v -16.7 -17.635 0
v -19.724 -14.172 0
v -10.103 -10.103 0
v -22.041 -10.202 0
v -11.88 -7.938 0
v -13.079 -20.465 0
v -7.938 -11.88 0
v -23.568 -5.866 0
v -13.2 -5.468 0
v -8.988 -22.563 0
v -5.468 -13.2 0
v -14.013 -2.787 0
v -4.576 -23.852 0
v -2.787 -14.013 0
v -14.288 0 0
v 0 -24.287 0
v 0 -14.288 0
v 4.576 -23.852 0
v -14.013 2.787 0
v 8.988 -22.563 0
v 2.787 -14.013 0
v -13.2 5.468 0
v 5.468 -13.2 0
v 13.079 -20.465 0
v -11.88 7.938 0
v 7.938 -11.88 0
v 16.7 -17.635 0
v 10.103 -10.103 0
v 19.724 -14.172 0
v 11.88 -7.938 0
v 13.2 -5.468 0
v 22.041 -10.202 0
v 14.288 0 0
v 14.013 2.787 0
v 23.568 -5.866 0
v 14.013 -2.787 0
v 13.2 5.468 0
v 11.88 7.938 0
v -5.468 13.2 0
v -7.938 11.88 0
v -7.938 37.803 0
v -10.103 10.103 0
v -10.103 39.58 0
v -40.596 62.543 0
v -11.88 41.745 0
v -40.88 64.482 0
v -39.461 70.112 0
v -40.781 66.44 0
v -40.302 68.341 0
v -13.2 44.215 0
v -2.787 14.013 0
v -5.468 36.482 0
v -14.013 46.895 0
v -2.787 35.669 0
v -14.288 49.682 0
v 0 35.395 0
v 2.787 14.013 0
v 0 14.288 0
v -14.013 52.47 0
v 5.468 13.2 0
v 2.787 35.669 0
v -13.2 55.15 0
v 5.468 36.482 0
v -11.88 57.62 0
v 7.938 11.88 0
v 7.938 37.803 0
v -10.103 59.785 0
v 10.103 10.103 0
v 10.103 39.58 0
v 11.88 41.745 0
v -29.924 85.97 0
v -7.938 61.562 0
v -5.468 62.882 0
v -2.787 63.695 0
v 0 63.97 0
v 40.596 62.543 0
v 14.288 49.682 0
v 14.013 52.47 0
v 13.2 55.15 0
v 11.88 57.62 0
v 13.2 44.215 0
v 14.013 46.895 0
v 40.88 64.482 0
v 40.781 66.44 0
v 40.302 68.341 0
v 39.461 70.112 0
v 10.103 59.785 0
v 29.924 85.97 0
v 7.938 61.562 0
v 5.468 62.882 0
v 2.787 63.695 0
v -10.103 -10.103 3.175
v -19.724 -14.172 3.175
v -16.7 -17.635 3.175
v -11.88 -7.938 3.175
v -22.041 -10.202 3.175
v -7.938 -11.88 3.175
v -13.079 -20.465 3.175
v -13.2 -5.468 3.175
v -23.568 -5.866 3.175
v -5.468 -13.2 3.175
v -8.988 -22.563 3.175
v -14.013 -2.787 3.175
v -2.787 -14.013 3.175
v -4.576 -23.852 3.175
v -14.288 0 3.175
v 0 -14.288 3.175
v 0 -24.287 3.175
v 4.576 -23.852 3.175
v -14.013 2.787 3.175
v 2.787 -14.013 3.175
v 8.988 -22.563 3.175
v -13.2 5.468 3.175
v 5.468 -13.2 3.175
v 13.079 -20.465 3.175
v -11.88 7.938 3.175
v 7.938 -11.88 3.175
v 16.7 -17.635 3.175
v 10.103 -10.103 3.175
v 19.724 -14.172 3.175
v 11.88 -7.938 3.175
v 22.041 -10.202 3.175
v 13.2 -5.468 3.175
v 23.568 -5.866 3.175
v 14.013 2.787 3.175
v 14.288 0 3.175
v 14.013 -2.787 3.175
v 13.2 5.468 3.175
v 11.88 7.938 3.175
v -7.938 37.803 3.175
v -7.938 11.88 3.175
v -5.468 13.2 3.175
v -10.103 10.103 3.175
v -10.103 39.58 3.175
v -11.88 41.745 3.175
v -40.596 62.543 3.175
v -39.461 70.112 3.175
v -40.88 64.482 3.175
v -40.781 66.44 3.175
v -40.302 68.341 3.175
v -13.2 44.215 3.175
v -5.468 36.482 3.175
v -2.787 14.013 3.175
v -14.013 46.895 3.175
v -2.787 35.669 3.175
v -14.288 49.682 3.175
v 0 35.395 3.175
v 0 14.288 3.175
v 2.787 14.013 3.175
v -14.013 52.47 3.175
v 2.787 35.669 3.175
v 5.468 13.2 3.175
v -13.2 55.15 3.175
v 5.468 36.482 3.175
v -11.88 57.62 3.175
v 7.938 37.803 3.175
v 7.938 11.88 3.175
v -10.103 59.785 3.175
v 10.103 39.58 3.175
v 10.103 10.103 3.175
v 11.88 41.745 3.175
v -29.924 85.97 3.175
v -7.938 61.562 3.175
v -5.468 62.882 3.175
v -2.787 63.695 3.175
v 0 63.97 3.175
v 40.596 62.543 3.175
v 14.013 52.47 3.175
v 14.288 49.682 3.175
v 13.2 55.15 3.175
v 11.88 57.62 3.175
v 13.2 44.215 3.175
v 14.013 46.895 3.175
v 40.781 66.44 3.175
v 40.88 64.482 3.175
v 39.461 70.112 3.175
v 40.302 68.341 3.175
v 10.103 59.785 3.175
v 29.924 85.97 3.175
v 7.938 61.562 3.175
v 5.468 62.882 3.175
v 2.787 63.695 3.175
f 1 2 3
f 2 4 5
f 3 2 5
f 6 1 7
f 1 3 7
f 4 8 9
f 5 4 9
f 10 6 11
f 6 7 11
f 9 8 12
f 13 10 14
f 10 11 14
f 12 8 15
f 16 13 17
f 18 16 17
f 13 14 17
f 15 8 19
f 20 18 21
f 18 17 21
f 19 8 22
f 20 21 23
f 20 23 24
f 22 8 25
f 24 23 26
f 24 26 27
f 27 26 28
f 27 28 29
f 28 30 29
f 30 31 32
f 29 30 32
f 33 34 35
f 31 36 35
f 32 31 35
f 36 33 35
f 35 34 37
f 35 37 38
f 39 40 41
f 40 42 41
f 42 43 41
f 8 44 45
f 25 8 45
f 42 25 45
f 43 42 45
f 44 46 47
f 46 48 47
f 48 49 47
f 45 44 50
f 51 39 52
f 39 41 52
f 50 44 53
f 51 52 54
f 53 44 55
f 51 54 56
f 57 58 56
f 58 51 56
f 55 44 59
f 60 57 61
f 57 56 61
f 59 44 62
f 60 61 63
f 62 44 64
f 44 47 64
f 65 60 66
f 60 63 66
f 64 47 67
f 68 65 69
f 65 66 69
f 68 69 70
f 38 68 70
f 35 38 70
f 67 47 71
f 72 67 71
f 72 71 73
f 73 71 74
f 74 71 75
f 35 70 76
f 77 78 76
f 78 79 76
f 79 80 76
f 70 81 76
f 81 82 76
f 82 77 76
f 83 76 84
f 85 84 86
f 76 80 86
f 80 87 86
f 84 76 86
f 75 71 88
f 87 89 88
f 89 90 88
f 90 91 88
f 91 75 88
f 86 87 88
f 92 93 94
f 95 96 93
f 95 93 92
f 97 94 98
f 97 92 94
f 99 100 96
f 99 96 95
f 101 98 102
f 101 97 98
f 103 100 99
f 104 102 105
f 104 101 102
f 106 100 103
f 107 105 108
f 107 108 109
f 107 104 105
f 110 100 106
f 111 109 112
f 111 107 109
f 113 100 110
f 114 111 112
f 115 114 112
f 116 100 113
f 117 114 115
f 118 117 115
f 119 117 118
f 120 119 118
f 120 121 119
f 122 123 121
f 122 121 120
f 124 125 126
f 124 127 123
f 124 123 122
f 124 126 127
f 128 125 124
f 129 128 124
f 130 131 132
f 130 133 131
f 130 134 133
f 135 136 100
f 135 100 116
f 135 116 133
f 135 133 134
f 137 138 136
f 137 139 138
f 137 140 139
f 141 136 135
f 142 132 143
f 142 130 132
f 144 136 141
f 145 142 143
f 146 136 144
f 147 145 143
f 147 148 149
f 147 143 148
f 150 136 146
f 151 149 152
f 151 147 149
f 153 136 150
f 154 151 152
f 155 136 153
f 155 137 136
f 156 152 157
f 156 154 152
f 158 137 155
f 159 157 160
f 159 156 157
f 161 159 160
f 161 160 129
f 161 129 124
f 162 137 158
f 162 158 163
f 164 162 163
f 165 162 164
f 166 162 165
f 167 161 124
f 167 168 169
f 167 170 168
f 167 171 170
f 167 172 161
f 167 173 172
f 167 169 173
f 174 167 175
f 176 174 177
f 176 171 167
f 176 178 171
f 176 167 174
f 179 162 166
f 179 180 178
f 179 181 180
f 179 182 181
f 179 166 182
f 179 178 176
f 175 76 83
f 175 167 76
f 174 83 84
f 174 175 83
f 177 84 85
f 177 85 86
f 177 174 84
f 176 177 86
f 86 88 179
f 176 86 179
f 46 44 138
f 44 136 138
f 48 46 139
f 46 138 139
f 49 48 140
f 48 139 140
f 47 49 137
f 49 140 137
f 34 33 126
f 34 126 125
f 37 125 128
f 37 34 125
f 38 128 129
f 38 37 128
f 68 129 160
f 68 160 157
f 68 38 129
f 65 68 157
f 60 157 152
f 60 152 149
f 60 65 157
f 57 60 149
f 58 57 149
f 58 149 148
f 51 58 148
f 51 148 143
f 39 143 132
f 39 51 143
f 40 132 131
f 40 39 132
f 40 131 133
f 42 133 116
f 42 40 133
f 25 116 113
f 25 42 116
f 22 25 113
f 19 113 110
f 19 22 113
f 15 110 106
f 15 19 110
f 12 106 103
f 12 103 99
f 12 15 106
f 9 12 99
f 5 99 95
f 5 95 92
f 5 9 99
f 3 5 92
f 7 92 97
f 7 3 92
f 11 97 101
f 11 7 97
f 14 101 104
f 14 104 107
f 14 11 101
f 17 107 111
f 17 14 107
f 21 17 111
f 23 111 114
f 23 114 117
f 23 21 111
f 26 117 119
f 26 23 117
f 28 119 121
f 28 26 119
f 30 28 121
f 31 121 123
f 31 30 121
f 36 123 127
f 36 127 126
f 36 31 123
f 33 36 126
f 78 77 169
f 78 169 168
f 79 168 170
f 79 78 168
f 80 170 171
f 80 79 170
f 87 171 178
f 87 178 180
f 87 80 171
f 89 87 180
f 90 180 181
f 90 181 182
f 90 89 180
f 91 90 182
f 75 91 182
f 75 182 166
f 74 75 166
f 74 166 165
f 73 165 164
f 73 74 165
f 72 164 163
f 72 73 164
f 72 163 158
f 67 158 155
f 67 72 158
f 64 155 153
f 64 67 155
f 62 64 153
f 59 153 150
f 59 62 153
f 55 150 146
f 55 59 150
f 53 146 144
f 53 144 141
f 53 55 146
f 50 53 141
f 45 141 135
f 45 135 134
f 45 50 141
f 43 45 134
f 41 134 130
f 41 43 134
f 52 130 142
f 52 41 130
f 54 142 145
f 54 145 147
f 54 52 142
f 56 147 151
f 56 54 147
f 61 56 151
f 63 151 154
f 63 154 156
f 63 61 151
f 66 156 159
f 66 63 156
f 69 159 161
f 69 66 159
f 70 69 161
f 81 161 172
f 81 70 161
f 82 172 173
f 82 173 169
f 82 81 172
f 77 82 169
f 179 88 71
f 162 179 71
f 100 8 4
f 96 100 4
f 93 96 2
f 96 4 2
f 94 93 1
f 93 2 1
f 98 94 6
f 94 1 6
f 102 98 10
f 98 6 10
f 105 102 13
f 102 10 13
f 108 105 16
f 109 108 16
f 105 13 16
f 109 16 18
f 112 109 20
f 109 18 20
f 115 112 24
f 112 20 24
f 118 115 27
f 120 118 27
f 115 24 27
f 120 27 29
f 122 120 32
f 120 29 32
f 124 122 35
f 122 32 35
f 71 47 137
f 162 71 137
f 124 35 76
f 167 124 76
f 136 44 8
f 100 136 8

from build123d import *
from OCP.BRepFilletAPI import BRepFilletAPI_MakeChamfer

# Parameters (mm, degrees)
SKETCH1_R           = 14.2875
BOSS_EXTRUDE1_DEPTH = 3.175
CHAMFER1_SIZE       = 20
CHAMFER1_SIZE2      = 16.502650584
FILLET1_R           = 10


with BuildPart() as part:
    # Sketch1 → Boss-Extrude1 (new body)
    with BuildSketch(Plane.XY):
        with BuildLine():
            ThreePointArc((-23.568403012, -5.866262499), (0, -24.2875), (23.568403012, -5.866262499))
            Line((23.568403012, -5.866262499), (46.42676282, 85.9699))
            Line((46.42676282, 85.9699), (-46.42676282, 85.9699))
            Line((-46.42676282, 85.9699), (-23.568403012, -5.866262499))
        make_face()
        Circle(SKETCH1_R, mode=Mode.SUBTRACT)
        with Locations((0, 49.6824)):
            Circle(SKETCH1_R, mode=Mode.SUBTRACT)
    extrude(amount=BOSS_EXTRUDE1_DEPTH)

    # Chamfer1: one chamfer whose edges measure the first distance from different faces: ONE call of the kernel's chamfer builder (chamfer() names one face for all edges)
    chamfer1_edges_1 = [part.edges().sort_by_distance(p)[0] for p in [
        (-46.42676282, 85.9699, 1.5875),
    ]]
    chamfer1_side_1 = [part.faces().sort_by_distance(p)[0] for p in [
        (-34.997582916, 40.05181875, 1.5875),
    ]]
    chamfer1_edges_2 = [part.edges().sort_by_distance(p)[0] for p in [
        (46.42676282, 85.9699, 1.5875),
    ]]
    chamfer1_side_2 = [part.faces().sort_by_distance(p)[0] for p in [
        (34.997582916, 40.05181875, 1.5875),
    ]]
    chamfer1 = BRepFilletAPI_MakeChamfer(part.part.solid().wrapped)
    for e in chamfer1_edges_1:
        chamfer1.Add(CHAMFER1_SIZE, CHAMFER1_SIZE2, e.wrapped, chamfer1_side_1[0].wrapped)  # the first distance lies on this face
    for e in chamfer1_edges_2:
        chamfer1.Add(CHAMFER1_SIZE, CHAMFER1_SIZE2, e.wrapped, chamfer1_side_2[0].wrapped)  # the first distance lies on this face
    add(Compound.cast(chamfer1.Shape()), mode=Mode.REPLACE)

    # Fillet1
    fillet1_edges = [part.edges().sort_by_distance(p)[0] for p in [
        (-41.596078312, 66.562053979, 1.5875),
        (41.596078312, 66.562053979, 1.5875),
    ]]
    fillet(fillet1_edges, radius=FILLET1_R)


solid = part.part
